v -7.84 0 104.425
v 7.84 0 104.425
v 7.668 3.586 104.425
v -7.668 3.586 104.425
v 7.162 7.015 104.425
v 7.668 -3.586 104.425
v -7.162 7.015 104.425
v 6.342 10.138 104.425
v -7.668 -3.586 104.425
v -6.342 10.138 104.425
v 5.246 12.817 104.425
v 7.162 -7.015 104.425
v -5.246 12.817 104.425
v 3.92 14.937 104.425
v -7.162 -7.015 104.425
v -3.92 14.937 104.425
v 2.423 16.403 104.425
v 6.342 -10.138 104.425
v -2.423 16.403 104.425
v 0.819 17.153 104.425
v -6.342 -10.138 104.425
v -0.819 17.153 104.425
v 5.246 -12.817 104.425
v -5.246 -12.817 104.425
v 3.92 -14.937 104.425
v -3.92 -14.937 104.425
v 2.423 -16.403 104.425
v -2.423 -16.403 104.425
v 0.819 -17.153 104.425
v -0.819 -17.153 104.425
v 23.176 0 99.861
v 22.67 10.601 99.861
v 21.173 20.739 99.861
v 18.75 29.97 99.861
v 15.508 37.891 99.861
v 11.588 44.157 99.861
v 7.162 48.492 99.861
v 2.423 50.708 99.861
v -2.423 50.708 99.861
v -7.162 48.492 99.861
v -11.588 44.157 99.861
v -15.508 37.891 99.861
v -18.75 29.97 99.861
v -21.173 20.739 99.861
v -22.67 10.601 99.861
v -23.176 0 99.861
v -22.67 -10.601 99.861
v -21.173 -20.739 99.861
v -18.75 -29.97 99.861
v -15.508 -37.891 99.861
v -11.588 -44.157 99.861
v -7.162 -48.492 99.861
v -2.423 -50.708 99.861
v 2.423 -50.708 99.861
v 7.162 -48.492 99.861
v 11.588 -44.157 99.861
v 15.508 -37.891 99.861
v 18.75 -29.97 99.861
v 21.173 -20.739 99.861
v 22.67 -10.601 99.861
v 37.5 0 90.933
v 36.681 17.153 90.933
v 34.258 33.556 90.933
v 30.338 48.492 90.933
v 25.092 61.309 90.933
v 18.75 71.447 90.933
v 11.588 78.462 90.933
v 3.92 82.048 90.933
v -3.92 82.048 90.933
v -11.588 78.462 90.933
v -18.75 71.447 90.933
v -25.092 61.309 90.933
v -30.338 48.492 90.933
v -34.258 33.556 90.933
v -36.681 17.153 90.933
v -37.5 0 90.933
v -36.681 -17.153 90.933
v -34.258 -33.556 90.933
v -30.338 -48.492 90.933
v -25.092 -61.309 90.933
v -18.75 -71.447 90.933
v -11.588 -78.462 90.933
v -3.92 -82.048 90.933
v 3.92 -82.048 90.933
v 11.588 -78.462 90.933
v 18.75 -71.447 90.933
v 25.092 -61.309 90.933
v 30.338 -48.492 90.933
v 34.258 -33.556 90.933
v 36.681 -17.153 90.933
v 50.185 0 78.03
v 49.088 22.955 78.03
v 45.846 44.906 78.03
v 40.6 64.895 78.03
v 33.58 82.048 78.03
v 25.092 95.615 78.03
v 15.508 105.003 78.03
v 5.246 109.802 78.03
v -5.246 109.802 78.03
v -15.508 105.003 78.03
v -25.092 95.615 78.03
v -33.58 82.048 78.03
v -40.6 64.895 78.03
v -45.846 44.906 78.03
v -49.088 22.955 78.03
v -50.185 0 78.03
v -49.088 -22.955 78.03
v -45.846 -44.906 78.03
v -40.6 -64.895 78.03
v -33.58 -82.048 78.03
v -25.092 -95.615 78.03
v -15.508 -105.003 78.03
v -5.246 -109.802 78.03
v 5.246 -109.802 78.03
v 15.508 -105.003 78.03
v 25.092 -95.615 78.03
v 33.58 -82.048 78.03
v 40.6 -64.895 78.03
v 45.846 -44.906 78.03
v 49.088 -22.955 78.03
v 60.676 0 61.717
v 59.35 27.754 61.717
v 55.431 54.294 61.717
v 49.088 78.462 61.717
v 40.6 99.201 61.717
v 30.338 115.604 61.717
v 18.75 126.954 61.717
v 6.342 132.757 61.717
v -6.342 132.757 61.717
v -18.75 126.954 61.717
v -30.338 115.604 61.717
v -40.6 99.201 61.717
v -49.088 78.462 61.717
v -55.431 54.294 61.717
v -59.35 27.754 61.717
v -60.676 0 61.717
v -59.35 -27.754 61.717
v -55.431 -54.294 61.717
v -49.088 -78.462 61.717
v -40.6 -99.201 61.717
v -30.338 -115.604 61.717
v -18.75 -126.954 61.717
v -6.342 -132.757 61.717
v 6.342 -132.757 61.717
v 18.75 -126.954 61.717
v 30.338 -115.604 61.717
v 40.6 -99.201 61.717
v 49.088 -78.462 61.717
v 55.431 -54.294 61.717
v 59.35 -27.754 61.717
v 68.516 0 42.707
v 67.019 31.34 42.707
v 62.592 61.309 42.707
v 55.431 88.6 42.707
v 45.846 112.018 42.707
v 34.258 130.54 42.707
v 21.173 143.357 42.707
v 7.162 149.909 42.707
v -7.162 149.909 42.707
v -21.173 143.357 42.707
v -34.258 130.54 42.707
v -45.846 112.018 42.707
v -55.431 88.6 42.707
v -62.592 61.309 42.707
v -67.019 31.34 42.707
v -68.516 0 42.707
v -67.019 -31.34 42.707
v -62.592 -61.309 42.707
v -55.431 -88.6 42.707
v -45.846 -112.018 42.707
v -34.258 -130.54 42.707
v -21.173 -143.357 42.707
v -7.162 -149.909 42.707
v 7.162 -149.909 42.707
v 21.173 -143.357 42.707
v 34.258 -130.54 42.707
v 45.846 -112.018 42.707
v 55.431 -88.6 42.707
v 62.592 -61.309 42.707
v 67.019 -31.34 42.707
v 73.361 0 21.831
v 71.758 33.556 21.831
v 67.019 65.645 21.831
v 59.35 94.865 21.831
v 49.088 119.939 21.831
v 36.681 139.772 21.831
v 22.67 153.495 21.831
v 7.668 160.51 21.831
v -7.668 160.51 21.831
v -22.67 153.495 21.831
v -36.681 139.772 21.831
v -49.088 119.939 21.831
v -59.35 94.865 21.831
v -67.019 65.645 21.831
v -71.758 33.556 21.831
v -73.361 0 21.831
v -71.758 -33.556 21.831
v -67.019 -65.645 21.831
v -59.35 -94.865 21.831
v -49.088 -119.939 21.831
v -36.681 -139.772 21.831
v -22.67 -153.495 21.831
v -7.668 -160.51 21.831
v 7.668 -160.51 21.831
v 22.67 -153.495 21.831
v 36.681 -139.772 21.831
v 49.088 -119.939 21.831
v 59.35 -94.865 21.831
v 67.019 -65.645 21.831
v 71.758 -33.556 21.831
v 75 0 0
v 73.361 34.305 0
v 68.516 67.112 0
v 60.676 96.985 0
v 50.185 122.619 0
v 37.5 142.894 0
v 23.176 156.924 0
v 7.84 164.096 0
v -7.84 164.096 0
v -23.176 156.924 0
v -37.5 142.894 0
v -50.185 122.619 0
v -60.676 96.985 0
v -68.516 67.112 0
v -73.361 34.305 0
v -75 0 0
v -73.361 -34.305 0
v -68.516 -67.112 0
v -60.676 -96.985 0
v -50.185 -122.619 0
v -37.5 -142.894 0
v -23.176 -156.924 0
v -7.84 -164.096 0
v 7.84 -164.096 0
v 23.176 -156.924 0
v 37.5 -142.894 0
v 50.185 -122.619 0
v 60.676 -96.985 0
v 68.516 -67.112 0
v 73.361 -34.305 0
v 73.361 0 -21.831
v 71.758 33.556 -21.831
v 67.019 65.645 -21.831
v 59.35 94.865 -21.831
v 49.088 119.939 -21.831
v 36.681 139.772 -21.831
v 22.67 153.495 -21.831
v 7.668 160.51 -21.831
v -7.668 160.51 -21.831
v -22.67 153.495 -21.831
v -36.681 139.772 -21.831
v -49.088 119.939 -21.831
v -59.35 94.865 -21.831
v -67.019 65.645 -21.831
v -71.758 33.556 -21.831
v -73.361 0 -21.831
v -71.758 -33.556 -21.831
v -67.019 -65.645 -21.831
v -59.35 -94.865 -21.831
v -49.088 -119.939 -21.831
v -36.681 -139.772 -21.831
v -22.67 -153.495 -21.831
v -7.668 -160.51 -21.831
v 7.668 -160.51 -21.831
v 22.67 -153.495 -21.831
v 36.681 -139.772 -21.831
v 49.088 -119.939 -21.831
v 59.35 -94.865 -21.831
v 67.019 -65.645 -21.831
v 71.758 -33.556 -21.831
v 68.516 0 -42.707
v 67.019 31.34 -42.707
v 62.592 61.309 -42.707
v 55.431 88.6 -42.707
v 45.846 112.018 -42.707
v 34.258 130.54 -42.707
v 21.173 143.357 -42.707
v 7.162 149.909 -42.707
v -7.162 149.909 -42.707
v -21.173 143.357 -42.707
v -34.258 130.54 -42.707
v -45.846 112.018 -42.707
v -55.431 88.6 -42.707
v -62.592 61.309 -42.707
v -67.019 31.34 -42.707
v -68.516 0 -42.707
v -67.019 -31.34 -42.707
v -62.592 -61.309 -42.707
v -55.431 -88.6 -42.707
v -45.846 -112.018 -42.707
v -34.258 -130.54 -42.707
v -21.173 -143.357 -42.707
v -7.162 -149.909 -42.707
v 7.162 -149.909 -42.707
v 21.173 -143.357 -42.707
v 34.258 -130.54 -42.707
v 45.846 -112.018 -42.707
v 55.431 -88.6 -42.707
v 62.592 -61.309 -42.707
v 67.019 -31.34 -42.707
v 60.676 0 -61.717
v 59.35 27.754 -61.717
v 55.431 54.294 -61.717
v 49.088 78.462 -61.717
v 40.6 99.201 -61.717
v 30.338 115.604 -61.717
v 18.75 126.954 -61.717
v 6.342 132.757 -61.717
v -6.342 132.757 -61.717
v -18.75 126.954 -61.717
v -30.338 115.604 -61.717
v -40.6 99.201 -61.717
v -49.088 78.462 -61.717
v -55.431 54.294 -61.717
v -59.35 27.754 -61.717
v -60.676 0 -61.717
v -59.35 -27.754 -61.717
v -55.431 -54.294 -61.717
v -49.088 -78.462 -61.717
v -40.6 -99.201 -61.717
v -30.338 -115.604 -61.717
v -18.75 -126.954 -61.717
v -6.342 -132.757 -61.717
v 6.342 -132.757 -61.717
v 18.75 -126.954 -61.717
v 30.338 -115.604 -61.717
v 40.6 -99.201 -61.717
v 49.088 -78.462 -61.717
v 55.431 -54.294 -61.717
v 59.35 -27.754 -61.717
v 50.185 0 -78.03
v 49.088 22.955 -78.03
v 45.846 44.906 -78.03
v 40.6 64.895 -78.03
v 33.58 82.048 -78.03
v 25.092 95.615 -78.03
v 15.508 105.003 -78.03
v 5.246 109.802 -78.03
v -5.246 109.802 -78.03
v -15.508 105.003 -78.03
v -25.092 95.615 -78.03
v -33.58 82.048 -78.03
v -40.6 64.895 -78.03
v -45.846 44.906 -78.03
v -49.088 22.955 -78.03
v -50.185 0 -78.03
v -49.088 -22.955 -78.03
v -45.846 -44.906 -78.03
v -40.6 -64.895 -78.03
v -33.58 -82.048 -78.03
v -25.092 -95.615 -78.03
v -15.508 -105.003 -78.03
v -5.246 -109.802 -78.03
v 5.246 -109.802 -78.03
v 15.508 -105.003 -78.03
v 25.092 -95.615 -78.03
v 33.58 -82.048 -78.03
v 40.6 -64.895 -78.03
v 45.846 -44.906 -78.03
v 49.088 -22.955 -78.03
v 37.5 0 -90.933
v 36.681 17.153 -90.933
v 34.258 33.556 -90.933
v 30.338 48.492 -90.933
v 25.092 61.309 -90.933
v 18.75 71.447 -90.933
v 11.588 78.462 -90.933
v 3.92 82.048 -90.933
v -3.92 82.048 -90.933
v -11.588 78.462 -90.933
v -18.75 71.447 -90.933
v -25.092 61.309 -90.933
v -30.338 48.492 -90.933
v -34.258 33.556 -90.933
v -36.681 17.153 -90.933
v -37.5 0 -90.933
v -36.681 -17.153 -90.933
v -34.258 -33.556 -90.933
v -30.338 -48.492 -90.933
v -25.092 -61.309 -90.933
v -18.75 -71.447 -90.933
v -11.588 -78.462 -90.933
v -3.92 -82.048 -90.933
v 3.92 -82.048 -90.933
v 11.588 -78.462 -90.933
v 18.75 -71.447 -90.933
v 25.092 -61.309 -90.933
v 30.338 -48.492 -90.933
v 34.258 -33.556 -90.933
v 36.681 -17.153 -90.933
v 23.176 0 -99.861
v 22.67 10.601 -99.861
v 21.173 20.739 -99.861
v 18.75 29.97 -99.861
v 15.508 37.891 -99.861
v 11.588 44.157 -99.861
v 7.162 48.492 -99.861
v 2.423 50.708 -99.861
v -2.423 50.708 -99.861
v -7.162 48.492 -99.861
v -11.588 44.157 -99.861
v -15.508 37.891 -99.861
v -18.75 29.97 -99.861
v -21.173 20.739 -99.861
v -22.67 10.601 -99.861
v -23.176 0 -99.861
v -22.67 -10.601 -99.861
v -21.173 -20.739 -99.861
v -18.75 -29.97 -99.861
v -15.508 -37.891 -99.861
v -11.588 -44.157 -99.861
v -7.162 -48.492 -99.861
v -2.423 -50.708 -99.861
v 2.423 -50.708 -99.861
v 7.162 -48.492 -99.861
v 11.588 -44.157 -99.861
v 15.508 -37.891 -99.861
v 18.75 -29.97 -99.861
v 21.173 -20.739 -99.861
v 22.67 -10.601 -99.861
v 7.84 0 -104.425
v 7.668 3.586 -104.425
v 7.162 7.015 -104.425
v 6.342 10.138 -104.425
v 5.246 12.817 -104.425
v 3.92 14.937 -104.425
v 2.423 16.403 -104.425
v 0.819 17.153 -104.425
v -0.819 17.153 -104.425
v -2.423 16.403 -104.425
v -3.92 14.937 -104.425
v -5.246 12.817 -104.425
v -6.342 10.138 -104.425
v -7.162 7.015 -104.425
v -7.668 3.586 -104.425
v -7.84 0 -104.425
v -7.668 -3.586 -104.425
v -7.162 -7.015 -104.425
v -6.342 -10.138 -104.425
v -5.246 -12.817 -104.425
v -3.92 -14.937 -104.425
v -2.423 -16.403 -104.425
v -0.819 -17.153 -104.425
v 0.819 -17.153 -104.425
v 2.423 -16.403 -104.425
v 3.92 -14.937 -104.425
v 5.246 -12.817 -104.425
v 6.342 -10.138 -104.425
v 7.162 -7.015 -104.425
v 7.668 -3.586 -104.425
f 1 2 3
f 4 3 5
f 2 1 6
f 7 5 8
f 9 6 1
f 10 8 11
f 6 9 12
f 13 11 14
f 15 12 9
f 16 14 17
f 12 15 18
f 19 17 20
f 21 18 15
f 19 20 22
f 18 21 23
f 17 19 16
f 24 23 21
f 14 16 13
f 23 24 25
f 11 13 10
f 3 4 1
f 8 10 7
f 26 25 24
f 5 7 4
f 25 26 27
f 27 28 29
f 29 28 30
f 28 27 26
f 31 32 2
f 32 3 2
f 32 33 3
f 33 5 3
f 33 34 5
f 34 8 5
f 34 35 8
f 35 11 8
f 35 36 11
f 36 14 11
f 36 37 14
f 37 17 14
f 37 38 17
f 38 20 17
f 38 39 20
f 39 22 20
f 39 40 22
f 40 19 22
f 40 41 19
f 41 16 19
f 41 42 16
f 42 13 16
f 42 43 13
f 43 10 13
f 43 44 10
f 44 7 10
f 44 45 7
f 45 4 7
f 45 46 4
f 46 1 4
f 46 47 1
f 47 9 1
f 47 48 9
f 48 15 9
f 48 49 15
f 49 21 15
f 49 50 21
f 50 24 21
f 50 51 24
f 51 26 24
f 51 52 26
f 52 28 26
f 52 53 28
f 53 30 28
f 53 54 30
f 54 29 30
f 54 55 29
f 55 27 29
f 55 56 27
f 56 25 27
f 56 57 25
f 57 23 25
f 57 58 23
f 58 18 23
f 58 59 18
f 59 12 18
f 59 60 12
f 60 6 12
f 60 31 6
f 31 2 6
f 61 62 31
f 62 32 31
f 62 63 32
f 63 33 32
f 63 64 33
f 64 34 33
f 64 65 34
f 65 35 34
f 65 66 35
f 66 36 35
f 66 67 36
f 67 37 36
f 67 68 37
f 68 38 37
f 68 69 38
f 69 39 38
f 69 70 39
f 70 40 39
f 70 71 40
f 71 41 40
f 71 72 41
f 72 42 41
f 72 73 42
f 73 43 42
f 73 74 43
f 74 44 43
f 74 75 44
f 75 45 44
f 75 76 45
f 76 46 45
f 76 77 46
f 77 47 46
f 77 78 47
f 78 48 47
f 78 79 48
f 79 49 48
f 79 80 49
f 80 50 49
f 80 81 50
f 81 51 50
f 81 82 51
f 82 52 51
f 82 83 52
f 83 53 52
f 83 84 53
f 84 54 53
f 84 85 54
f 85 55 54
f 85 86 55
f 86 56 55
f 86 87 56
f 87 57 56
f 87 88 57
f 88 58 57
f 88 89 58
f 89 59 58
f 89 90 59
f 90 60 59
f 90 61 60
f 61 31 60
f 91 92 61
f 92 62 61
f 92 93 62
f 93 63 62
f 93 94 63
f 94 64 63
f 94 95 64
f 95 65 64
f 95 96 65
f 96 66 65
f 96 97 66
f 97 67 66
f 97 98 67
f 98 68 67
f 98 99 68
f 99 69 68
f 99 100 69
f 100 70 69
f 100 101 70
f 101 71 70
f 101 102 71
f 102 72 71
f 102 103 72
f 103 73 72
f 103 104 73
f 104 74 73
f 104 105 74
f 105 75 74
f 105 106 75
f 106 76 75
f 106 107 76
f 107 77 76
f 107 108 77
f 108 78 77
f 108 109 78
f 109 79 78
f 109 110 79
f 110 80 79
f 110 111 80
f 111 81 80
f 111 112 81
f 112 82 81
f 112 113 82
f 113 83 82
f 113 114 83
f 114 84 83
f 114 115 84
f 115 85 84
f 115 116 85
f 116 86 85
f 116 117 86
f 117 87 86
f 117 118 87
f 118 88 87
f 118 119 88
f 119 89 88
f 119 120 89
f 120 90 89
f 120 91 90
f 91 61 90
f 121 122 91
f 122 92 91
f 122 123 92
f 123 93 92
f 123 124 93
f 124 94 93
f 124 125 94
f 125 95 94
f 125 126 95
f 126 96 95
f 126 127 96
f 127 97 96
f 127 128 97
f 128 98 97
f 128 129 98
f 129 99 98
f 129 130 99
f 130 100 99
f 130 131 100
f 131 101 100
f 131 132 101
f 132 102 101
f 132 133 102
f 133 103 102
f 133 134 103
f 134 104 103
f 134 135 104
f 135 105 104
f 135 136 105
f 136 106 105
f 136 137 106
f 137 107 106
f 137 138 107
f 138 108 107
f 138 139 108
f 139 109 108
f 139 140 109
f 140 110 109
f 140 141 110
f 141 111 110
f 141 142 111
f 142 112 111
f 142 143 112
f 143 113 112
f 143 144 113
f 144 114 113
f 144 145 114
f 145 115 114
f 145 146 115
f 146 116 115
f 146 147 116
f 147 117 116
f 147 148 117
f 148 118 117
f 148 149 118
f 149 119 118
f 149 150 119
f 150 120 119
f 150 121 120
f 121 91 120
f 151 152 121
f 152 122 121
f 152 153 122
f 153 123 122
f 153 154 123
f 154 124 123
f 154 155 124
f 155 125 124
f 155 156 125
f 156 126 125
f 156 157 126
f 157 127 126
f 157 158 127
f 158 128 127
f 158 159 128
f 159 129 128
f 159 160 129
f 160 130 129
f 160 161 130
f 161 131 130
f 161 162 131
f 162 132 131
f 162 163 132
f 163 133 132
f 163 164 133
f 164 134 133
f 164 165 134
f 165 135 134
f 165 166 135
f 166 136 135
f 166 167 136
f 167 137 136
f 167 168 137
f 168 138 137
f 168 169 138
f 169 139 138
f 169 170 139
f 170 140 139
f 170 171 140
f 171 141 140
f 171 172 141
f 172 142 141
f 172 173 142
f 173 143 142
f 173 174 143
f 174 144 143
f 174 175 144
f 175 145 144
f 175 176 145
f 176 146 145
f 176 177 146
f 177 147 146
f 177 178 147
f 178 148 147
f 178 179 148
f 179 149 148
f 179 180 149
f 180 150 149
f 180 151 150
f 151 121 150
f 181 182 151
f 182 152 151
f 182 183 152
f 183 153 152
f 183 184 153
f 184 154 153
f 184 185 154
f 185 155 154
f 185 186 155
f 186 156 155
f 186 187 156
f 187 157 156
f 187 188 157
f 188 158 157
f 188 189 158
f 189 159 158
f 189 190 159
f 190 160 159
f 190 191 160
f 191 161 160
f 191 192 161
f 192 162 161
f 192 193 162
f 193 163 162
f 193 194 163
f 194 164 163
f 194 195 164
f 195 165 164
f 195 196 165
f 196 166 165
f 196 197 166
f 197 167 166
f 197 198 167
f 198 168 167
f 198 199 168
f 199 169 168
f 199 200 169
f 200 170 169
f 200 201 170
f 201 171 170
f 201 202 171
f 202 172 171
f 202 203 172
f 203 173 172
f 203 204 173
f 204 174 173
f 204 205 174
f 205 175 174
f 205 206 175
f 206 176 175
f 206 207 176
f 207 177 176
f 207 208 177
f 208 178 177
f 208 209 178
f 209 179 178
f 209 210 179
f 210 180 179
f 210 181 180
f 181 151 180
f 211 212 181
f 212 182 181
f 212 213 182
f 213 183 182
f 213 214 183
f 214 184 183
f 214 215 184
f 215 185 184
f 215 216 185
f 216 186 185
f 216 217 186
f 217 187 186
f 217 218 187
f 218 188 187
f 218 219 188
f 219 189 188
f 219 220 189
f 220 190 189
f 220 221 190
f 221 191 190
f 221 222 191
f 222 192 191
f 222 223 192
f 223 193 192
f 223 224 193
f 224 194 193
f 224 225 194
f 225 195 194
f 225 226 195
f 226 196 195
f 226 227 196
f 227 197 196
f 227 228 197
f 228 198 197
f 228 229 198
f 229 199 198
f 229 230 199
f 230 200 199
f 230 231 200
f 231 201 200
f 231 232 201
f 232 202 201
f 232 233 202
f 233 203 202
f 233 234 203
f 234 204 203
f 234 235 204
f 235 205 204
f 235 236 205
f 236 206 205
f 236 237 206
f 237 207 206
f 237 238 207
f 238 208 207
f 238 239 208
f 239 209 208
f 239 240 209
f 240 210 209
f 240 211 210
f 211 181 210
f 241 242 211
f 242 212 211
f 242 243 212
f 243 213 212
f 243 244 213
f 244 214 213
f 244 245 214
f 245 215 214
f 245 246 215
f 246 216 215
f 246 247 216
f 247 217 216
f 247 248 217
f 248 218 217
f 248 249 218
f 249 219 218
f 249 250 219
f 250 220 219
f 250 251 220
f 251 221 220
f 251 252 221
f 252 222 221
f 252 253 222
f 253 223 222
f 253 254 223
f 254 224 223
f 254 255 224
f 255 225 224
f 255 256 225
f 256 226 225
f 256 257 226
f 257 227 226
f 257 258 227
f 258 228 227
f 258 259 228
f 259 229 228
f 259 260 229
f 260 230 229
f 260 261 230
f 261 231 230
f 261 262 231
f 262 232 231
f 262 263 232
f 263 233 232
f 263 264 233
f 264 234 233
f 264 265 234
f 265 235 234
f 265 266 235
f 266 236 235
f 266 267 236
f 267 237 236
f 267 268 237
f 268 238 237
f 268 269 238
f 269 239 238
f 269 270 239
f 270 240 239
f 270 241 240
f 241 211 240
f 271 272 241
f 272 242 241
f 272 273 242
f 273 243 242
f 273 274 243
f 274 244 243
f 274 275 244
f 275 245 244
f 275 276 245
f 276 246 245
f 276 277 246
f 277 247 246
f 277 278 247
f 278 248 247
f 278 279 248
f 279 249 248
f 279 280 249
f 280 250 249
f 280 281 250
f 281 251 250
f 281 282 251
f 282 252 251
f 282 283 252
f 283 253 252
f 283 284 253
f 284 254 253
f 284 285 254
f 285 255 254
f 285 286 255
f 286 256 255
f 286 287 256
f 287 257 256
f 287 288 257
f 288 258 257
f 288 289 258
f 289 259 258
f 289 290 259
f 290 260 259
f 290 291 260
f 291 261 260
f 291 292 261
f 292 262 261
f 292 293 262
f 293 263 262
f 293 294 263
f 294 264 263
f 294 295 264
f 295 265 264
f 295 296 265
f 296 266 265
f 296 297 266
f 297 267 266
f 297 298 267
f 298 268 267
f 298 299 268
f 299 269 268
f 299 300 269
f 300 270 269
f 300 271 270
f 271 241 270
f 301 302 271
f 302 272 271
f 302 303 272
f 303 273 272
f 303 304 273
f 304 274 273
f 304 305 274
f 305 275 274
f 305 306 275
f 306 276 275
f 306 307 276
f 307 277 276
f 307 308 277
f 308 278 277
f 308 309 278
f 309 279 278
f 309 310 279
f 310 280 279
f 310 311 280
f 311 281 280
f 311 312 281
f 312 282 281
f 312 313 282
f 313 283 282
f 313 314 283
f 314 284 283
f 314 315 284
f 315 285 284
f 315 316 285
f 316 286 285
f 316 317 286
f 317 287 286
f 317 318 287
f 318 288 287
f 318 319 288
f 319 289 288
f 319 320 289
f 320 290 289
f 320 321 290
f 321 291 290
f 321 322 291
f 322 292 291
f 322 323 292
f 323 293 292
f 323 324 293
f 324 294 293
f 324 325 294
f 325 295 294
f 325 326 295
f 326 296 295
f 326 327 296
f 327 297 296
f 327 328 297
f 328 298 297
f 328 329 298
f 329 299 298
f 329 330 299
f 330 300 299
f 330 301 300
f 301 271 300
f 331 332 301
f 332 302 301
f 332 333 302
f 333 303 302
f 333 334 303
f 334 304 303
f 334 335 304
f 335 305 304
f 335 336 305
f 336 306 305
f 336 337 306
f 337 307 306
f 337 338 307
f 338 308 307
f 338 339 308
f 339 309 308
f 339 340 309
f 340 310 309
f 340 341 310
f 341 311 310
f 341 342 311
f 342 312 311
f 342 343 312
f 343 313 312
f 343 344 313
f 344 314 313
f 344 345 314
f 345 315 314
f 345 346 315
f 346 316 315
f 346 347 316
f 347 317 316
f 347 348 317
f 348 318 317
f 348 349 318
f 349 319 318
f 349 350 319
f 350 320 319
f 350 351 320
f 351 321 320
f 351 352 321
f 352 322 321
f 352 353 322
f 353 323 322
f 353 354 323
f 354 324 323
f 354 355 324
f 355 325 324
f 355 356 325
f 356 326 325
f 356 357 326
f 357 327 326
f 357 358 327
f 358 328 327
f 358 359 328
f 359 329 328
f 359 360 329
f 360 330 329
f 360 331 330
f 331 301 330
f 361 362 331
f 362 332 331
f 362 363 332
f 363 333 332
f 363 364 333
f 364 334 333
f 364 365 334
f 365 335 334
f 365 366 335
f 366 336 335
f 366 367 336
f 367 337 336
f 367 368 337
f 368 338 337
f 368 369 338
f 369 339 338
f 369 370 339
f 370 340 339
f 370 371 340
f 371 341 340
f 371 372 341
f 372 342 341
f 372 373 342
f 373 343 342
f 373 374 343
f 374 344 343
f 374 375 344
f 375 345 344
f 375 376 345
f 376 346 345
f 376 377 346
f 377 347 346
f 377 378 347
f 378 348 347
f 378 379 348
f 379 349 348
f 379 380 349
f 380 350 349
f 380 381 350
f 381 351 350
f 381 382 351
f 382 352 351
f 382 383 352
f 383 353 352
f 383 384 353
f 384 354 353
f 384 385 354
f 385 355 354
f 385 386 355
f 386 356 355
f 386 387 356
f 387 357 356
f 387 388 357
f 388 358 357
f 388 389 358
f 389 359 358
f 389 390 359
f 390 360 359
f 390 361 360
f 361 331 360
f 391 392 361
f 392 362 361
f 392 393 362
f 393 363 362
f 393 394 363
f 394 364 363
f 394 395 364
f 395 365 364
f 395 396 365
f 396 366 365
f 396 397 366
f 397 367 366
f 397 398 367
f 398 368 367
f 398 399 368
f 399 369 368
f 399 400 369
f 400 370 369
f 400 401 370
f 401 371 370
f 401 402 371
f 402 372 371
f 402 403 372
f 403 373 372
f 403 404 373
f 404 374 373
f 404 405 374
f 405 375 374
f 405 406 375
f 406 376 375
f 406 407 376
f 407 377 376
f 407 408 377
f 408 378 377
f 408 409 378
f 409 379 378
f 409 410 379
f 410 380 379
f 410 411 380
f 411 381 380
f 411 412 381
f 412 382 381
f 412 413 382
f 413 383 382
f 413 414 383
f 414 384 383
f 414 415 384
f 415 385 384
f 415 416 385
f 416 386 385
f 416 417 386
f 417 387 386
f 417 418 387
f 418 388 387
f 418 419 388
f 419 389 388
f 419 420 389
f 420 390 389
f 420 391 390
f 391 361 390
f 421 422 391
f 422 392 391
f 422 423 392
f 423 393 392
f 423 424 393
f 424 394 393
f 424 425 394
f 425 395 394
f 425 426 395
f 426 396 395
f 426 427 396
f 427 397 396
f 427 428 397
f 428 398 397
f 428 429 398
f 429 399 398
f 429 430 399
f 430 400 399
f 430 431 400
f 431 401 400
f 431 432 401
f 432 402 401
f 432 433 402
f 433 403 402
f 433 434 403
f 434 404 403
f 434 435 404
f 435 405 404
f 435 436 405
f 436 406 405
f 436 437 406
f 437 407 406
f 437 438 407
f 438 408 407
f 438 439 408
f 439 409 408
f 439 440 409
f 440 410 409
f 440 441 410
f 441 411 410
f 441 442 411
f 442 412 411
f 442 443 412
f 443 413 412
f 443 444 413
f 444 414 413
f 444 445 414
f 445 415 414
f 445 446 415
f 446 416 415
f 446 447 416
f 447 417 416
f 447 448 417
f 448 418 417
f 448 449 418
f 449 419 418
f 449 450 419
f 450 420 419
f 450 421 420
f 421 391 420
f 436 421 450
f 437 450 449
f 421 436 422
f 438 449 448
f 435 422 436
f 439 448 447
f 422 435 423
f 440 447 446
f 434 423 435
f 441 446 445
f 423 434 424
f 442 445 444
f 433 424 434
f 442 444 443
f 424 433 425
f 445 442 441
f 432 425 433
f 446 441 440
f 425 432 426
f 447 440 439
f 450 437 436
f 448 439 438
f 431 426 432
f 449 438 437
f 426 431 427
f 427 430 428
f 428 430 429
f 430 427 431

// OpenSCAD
// Generated by SolidPython 1.0.1 on 2020-07-29 00:46:46


scale(v = [5, 11, 7]) {
	sphere(r = 15);
}
/***********************************************
*********      SolidPython code:      **********
************************************************
 
# import packages: SolidPython
from solid import *
from solid.utils import *
from itertools import chain, combinations, permutations


class Resize:

    def __init__(self, scad_file):
        self.scad_file = scad_file
        #self.scad_file = import_scad(scad_file)
        # cone/cylinder param:
        self.r1 = 0
        self.r2 = 0
        self.h = 0
        # rectangular prism param:
        self.w = 0
        self.l = 0
        # ellipse param:
        self.r = 0

    # import OpenScad code (file name corresponds to shape)


    # classify shape + parameters
    def assign(self, param1, param2, param3):
        if self.scad_file == 'cone.scad':
            self.r1 = param1
            self.r2 = param2
            self.h = param3
        elif self.scad_file == 'cylinder.scad':
            self.r1 = param1
            self.r2 = param2
            self.h = param3
        elif self.scad_file == 'rectangularPrism.scad':
            self.h = param1
            self.l = param2
            self.w = param3
        else:
            self.r = param1
            self.h = param2

    # resize parameters
    def iterate(self):
        x = range(3, 20, 2)
        i = 1
        if self.scad_file == 'cone.scad':
            tempList = list(permutations(x, 2))
            for temp in tempList:
                param1 = temp[0]
                param2 = temp[1]
                filepath = 'produced_scad_files/' + 'cone' + str(param1) + '_' + str(param2) + '_' + '.scad'
                scad_render_to_file(cylinder(h=param1, r1=param2, r2=0), filepath)

        elif self.scad_file == 'cylinder.scad':
            tempList = list(permutations(x, 3))
            for temp in tempList:
                param1 = temp[0]
                param2 = temp[1]
                filepath = 'produced_scad_files/' + 'cylinder' + str(param1) + '_' + str(param2) + '_' + '.scad'
                scad_render_to_file(cylinder(h=param1, r1=param2, r2=param2), filepath)

        elif self.scad_file == 'rectangularPrism.scad':
            tempList = list(permutations(x, 3))
            for temp in tempList:
                param1 = temp[0]
                param2 = temp[1]
                param3 = temp[2]
                filepath = 'produced_scad_files/' + 'rectangularPrism' + str(param1) + '_' + str(param2) + '_' + str(
                    param3) + '.scad'
                scad_render_to_file(cube(size=(param1, param2, param3)), filepath)

        elif self.scad_file == 'ellipse.scad':
            tempList = list(permutations(x, 4))
            for temp in tempList:
                param1 = temp[0]
                param2 = temp[1]
                param3 = temp[2]
                param4 = temp[3]
                filepath = 'produced_scad_files/' + 'ellipse' + str(param1) + '_' + str(param2) + '_' + str(param3) + '_' + str(param4) + '.scad'
                scad_render_to_file(scale([param1, param2, param3])(sphere(r=param4)), filepath)

    def render_to_scadfile(self):
        scad_render_to_file(scad, 'example.scad') 
 
************************************************/
